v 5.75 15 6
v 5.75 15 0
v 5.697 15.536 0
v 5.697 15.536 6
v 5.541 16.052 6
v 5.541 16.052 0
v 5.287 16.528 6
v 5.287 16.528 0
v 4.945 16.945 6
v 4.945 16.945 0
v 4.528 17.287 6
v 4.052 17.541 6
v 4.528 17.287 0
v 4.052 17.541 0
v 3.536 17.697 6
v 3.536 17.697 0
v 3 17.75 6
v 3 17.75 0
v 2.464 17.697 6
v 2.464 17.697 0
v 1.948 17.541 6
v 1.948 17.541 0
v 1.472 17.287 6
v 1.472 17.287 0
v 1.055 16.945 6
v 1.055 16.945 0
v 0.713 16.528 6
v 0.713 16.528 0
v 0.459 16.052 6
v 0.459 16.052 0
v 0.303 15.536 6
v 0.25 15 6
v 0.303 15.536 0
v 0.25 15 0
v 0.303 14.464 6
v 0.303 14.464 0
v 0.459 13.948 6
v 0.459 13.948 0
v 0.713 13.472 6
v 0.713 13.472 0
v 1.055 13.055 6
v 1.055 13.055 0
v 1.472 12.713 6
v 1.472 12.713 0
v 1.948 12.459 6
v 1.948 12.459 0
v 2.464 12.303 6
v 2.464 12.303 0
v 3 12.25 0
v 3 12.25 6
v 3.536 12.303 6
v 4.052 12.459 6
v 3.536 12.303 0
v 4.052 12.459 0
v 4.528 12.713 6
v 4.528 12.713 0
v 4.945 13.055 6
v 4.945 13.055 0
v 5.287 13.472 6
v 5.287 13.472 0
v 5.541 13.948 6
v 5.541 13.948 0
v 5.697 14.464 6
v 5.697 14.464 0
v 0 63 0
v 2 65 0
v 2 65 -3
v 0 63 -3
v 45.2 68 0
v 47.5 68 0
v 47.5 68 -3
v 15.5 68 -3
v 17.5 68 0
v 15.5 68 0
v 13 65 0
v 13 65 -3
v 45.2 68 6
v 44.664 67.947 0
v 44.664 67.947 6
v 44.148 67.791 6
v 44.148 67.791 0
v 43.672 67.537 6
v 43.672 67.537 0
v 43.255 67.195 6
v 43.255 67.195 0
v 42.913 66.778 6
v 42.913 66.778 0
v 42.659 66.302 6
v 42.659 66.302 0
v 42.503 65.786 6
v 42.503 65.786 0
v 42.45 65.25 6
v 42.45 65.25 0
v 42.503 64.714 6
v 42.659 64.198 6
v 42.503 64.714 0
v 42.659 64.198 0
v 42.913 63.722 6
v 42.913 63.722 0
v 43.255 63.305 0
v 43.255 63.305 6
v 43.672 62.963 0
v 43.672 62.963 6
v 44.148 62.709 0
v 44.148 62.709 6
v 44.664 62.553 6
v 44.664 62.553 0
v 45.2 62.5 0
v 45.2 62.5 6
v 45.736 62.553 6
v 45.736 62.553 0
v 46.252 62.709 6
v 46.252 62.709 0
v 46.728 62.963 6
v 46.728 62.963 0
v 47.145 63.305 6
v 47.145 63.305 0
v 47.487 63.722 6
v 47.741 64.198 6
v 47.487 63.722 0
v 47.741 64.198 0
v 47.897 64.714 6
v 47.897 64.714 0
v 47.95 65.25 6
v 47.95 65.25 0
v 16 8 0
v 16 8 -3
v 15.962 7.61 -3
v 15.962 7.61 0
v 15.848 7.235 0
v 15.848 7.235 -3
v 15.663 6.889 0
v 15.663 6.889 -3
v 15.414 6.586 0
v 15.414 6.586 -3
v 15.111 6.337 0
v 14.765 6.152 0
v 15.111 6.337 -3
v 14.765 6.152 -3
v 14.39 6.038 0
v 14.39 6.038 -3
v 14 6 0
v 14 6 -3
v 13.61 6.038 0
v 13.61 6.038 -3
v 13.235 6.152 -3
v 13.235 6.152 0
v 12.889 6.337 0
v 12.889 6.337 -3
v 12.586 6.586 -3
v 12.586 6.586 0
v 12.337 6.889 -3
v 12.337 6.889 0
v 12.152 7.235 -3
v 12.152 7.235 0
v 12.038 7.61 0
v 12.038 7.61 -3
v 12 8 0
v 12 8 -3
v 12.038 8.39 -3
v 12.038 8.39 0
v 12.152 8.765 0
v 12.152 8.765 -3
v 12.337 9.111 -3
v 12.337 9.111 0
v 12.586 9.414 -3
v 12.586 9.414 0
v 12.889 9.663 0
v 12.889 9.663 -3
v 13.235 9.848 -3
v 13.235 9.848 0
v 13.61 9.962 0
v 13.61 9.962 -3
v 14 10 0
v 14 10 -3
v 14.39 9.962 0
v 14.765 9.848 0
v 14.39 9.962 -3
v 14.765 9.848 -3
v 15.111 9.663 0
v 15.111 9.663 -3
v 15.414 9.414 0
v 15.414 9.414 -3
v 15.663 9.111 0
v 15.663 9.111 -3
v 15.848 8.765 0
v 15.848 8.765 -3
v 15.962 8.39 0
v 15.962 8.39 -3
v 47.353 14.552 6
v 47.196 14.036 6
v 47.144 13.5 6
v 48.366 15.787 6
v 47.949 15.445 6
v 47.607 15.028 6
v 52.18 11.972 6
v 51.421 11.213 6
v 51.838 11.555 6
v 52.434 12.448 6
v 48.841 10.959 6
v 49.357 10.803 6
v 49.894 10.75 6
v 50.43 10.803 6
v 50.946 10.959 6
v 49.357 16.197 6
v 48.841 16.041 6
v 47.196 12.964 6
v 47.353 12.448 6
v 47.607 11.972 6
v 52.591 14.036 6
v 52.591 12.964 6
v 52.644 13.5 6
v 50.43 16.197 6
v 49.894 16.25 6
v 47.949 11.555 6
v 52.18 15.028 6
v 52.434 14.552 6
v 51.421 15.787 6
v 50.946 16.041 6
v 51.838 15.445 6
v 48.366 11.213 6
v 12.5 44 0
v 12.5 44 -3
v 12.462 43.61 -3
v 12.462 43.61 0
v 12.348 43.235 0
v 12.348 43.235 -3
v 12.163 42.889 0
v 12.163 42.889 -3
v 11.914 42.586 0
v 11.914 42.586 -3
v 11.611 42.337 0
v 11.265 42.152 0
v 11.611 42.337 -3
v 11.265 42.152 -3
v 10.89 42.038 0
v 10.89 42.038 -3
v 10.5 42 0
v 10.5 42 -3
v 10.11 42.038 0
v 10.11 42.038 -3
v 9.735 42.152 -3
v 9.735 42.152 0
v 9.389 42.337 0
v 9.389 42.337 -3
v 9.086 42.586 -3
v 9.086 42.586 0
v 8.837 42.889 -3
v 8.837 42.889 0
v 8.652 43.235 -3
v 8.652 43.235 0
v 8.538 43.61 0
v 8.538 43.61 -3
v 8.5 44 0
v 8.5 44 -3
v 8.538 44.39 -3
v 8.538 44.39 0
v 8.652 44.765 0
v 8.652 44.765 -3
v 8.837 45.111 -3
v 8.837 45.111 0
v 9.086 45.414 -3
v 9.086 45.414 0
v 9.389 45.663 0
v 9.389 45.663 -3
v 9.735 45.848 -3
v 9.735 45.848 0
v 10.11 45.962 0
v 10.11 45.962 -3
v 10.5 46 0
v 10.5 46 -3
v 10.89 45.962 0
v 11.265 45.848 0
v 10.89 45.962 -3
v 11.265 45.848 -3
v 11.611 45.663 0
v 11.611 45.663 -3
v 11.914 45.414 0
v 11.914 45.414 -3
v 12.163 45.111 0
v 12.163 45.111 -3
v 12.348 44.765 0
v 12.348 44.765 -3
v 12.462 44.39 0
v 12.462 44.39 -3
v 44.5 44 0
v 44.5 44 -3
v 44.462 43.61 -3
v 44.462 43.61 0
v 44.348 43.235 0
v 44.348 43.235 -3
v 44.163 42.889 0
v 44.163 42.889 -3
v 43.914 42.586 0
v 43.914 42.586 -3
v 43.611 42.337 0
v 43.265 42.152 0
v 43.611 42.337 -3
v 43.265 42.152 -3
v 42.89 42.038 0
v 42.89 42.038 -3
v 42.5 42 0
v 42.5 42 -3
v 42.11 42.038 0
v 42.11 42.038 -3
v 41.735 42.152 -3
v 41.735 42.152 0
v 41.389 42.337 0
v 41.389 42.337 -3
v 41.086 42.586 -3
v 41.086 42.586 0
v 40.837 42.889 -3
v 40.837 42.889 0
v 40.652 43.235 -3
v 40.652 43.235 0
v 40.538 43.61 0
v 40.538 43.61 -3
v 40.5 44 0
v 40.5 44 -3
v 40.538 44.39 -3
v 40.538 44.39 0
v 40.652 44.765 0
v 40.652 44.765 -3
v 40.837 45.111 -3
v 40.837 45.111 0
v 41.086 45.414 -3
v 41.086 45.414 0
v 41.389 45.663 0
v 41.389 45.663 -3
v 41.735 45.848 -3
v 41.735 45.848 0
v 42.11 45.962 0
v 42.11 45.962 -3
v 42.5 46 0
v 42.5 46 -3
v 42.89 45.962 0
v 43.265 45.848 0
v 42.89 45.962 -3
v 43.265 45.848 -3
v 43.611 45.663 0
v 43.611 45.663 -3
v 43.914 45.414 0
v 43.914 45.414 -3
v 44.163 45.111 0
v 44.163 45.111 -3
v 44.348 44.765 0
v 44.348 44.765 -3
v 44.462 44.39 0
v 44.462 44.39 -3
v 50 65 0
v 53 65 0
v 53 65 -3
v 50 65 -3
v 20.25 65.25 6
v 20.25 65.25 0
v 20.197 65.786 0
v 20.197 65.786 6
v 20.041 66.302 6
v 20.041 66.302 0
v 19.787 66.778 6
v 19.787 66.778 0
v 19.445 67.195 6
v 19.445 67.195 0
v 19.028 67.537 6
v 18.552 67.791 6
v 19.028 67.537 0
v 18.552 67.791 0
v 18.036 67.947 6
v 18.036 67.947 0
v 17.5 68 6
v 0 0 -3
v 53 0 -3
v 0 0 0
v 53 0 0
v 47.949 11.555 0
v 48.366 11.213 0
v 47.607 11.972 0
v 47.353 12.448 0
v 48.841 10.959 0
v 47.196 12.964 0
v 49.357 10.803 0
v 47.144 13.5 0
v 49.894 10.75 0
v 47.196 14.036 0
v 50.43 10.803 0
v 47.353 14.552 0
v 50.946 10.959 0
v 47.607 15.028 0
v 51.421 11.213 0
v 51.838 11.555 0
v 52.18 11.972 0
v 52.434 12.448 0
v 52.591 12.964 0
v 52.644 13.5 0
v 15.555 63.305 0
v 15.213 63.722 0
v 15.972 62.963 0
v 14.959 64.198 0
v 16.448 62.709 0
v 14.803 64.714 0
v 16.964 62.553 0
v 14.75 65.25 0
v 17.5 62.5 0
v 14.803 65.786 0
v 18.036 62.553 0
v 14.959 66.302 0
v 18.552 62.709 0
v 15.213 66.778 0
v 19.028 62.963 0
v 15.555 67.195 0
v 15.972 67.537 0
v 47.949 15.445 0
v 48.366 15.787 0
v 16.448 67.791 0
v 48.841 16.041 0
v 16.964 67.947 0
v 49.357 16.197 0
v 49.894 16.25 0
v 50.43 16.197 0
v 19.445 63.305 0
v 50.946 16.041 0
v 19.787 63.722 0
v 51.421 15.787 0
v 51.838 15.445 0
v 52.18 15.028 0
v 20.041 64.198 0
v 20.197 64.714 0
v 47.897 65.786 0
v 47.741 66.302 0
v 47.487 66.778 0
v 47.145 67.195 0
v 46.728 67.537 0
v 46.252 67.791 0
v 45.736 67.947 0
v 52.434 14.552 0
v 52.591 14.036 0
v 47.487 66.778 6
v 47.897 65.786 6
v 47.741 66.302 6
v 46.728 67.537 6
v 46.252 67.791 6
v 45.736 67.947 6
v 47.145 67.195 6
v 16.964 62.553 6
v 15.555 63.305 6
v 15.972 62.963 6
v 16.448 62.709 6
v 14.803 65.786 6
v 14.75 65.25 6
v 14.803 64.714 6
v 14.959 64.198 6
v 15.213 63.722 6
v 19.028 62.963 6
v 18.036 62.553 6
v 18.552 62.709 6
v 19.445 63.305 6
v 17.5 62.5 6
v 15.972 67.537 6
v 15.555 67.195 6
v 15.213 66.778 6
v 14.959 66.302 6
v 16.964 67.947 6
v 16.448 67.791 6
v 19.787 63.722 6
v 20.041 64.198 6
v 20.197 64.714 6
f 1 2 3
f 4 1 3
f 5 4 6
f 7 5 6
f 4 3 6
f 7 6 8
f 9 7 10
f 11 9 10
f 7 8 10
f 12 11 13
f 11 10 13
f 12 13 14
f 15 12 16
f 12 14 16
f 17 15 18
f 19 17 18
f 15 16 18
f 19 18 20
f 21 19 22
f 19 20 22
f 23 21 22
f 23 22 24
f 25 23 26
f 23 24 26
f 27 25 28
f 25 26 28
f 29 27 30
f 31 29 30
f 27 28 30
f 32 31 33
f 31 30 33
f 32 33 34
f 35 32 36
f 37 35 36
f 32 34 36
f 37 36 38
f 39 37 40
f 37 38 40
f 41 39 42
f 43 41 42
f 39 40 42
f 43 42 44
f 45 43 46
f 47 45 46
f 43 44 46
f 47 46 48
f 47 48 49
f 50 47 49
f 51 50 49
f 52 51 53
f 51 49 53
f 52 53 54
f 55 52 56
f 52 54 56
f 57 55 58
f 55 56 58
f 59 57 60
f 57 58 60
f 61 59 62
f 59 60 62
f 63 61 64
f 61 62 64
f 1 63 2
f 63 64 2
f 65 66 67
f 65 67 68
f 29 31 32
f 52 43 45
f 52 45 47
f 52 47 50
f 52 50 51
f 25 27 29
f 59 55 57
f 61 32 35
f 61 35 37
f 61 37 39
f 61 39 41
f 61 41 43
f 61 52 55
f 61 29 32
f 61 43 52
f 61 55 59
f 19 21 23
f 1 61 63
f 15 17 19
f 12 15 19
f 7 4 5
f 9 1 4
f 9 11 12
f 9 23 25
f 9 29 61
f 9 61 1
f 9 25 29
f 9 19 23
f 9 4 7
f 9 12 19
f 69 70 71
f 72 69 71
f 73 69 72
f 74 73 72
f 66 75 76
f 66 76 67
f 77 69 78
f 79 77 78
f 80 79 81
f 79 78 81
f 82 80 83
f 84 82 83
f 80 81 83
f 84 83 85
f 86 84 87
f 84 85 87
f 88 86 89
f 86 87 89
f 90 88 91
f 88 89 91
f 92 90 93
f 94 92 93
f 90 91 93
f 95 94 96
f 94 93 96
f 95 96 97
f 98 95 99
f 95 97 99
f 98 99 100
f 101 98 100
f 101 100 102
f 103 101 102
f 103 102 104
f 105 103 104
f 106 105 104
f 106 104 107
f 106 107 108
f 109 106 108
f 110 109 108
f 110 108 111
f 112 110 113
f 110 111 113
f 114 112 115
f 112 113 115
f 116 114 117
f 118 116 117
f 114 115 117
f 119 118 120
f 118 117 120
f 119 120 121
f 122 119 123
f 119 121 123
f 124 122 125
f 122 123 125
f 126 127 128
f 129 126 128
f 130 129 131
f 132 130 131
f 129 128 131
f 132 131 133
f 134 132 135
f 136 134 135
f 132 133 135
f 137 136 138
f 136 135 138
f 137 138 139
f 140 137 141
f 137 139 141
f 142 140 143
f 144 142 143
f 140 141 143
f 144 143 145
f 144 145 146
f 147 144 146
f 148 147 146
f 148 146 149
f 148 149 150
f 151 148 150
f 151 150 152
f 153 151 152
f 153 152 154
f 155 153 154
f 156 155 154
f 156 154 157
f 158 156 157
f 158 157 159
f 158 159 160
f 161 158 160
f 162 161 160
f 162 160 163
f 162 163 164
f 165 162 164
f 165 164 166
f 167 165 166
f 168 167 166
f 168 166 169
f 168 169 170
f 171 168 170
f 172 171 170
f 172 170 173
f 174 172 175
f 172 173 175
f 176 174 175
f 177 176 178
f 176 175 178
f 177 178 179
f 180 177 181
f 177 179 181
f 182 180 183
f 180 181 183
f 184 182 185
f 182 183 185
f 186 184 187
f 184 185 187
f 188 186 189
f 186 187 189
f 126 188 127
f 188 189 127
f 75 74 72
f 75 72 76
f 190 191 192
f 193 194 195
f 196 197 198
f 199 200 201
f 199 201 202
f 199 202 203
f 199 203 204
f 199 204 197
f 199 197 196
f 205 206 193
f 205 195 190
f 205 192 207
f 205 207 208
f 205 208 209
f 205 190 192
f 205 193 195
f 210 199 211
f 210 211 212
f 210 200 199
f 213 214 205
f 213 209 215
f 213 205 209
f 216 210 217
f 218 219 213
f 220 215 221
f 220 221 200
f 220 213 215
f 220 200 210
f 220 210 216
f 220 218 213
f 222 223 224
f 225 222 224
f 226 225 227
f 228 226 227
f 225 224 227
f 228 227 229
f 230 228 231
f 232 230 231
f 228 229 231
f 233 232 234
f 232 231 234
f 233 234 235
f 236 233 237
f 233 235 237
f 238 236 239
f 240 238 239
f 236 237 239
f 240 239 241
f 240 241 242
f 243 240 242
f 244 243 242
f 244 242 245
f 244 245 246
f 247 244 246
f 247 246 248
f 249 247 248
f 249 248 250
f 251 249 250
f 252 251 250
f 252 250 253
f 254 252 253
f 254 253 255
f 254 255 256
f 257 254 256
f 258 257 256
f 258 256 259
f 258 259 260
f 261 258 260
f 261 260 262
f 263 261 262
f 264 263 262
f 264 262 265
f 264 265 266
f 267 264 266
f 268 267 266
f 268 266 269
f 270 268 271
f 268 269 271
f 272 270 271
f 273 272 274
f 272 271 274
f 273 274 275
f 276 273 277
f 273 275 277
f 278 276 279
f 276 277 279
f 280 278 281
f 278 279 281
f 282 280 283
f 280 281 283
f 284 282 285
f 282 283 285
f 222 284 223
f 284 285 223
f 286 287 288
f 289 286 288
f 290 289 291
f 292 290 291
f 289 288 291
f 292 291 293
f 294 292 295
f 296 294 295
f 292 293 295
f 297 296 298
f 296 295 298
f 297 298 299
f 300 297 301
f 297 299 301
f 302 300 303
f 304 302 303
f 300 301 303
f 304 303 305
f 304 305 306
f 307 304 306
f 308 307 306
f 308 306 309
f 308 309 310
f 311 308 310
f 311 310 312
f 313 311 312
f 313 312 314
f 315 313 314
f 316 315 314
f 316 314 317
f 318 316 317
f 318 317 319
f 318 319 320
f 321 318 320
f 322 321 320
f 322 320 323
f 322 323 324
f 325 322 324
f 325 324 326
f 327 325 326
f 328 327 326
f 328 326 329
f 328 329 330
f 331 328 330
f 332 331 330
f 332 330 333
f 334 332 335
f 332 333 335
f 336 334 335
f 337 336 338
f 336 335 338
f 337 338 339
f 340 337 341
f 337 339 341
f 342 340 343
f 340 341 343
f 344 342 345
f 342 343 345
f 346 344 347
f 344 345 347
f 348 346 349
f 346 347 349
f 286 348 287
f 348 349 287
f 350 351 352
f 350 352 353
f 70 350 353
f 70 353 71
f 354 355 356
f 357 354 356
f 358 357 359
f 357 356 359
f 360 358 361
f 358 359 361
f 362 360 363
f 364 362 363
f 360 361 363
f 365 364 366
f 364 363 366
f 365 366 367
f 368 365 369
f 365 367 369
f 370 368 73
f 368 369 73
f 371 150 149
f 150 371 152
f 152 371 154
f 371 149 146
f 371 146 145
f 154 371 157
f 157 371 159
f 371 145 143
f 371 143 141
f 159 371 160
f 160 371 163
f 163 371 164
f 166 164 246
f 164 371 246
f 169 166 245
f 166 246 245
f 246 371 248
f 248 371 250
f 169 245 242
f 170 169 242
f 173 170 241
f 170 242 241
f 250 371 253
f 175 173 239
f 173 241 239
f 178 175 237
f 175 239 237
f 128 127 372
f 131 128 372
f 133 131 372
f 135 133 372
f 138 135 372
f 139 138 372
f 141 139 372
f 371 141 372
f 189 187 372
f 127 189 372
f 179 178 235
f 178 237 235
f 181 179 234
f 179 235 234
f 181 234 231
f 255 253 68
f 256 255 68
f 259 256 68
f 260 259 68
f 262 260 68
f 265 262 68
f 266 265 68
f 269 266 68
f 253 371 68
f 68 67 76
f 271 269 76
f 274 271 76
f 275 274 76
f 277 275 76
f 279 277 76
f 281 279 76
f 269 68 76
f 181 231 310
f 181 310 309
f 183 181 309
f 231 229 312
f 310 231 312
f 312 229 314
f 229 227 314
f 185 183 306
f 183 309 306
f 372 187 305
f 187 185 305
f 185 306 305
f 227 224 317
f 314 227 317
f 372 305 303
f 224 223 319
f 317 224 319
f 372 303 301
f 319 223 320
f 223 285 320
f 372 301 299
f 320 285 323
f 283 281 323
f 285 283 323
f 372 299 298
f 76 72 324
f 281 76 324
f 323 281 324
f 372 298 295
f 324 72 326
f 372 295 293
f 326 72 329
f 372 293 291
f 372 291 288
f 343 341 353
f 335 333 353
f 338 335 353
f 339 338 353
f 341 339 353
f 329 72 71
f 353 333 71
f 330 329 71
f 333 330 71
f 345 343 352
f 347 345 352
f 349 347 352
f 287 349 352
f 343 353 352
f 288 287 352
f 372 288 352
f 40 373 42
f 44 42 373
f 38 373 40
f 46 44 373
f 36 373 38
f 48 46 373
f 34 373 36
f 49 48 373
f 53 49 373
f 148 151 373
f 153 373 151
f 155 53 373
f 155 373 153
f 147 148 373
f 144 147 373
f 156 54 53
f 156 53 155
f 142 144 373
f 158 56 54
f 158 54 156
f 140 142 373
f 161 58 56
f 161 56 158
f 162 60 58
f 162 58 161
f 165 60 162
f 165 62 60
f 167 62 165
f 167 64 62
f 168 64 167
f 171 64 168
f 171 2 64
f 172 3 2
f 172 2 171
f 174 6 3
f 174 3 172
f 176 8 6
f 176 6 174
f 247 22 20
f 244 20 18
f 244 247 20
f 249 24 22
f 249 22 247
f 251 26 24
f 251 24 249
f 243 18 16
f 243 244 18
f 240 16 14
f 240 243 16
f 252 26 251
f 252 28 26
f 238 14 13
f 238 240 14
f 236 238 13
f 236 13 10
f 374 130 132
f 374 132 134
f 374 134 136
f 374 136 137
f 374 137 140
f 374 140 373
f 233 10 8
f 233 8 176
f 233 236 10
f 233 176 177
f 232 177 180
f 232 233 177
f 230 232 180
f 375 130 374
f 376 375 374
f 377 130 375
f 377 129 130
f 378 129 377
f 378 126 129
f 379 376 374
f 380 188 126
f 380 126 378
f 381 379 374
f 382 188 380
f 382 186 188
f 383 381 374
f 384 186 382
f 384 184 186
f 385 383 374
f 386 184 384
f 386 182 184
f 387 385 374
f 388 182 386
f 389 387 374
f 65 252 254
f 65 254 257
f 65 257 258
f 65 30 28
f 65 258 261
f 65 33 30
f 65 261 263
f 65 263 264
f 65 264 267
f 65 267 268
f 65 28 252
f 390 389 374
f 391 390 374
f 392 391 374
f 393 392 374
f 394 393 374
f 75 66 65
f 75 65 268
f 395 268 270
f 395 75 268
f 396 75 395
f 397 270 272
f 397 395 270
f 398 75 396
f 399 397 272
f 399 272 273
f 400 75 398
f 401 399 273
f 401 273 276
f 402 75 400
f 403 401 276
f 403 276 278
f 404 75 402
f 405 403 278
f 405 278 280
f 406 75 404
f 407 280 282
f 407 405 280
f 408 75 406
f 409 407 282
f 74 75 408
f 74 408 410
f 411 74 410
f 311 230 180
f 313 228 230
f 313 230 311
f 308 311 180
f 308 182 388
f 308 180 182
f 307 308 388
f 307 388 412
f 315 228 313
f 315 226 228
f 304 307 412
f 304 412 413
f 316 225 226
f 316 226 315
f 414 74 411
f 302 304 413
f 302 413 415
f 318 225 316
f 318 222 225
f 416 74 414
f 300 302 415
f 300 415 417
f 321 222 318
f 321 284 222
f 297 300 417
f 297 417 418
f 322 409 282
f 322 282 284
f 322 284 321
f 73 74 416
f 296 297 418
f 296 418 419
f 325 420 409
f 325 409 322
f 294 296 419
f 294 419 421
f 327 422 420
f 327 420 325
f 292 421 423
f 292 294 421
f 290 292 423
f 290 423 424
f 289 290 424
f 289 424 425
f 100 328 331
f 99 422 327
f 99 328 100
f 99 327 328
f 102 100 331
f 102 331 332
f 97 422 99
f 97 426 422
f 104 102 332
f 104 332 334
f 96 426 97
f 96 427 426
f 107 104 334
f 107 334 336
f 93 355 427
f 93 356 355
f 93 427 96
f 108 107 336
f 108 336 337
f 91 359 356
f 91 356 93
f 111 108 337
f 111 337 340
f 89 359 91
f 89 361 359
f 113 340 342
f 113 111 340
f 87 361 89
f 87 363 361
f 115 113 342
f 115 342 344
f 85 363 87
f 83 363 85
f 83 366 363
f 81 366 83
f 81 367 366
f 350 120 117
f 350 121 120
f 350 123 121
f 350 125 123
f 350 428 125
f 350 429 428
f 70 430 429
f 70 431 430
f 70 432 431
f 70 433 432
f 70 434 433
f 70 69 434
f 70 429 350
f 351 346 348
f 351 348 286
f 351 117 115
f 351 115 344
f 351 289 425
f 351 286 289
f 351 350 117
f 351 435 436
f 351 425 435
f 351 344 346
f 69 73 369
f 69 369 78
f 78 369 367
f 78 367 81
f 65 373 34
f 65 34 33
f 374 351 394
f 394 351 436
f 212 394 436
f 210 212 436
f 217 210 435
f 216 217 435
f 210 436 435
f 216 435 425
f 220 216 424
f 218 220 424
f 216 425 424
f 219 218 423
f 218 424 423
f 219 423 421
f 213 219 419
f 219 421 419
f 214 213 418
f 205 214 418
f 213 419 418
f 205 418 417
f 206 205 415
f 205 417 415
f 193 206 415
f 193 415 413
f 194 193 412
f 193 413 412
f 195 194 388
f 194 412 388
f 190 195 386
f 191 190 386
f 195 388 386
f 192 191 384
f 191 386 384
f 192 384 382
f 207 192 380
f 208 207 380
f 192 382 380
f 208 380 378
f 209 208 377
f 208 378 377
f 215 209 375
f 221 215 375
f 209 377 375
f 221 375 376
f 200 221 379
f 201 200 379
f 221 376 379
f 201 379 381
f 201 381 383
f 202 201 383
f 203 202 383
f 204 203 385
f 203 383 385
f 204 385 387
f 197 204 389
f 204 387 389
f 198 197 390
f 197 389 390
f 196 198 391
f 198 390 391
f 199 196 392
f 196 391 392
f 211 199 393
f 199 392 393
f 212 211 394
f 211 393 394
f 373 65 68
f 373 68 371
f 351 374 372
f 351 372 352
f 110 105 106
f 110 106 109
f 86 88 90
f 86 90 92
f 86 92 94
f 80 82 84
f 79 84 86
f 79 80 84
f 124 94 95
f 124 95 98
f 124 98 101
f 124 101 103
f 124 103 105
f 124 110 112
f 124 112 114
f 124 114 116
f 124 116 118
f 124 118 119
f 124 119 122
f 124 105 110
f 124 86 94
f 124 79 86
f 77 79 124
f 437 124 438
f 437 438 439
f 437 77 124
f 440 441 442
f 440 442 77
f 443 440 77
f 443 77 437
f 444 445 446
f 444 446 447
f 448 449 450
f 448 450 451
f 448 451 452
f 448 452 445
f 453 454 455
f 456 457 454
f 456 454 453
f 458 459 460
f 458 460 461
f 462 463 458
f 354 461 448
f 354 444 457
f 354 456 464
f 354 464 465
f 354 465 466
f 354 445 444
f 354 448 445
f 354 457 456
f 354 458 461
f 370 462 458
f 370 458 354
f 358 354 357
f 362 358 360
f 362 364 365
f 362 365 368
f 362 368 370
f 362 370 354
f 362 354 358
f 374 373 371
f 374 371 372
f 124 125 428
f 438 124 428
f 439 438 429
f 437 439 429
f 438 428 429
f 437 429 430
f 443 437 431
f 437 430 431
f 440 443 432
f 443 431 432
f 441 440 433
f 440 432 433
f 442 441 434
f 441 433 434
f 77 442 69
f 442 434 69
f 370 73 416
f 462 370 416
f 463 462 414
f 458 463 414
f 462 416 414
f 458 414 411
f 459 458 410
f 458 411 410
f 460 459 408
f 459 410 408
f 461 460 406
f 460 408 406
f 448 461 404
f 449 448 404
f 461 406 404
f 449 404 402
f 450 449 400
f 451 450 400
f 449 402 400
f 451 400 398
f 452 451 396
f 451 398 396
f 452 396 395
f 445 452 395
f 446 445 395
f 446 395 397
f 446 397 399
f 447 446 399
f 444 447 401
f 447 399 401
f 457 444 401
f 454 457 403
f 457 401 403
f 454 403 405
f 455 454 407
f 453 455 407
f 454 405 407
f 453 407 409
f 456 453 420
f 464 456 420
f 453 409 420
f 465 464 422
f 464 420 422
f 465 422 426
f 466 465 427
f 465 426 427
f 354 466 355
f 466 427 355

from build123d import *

# Parameters (mm, degrees)
F0_R     = 2.75
F1_DEPTH = 3
F2_DEPTH = 6
F3_R     = 2
F4_DEPTH = 25


with BuildPart() as f1:
    # F0 (on Top) → F1 (new body)
    with BuildSketch(Plane.XY):
        Polygon((0, 63), (0, 0), (53, 0), (53, 65), (50, 65), (47.5, 68), (45.2, 68), (17.5, 68), (15.5, 68), (13, 65), (2, 65), align=None)
        with Locations((3, 15)):
            Circle(F0_R, mode=Mode.SUBTRACT)
        with Locations((49.8936027288, 13.5)):
            Circle(F0_R, mode=Mode.SUBTRACT)
        with BuildLine():
            ThreePointArc((20.25, 65.25), (15.5554563517, 63.3054563517), (17.5, 68))
            ThreePointArc((17.5, 68), (19.4445436483, 67.1945436483), (20.25, 65.25))
        make_face(mode=Mode.SUBTRACT)
        with BuildLine():
            ThreePointArc((47.95, 65.25), (43.2554563517, 63.3054563517), (45.2, 68))
            ThreePointArc((45.2, 68), (47.1445436483, 67.1945436483), (47.95, 65.25))
        make_face(mode=Mode.SUBTRACT)
        with BuildLine():
            ThreePointArc((47.95, 65.25), (47.1445436483, 67.1945436483), (45.2, 68))
            ThreePointArc((45.2, 68), (43.2554563517, 63.3054563517), (47.95, 65.25))
        make_face()
        with BuildLine():
            ThreePointArc((20.25, 65.25), (19.4445436483, 67.1945436483), (17.5, 68))
            ThreePointArc((17.5, 68), (15.5554563517, 63.3054563517), (20.25, 65.25))
        make_face()
        with Locations((3, 15)):
            Circle(F0_R)
        with Locations((49.8936027288, 13.5)):
            Circle(F0_R)
    extrude(amount=-F1_DEPTH)

    # F0 (on Top) → F2 (join)
    with BuildSketch(Plane.XY):
        with BuildLine():
            ThreePointArc((20.25, 65.25), (19.4445436483, 67.1945436483), (17.5, 68))
            ThreePointArc((17.5, 68), (15.5554563517, 63.3054563517), (20.25, 65.25))
        make_face()
        with BuildLine():
            ThreePointArc((47.95, 65.25), (47.1445436483, 67.1945436483), (45.2, 68))
            ThreePointArc((45.2, 68), (43.2554563517, 63.3054563517), (47.95, 65.25))
        make_face()
        with Locations((49.8936027288, 13.5)):
            Circle(F0_R)
        with Locations((3, 15)):
            Circle(F0_R)
    extrude(amount=F2_DEPTH)

    # F3 (on face) → F4 (cut)
    with BuildSketch(Plane(origin=(0, 0, -3), x_dir=(1, 0, 0), z_dir=(0, 0, -1))):
        with Locations((42.5, -44)):
            Circle(F3_R)
        with Locations((10.5, -44)):
            Circle(F3_R)
        with Locations((14, -8)):
            Circle(F3_R)
    extrude(amount=-F4_DEPTH, mode=Mode.SUBTRACT)


solid = f1.part
